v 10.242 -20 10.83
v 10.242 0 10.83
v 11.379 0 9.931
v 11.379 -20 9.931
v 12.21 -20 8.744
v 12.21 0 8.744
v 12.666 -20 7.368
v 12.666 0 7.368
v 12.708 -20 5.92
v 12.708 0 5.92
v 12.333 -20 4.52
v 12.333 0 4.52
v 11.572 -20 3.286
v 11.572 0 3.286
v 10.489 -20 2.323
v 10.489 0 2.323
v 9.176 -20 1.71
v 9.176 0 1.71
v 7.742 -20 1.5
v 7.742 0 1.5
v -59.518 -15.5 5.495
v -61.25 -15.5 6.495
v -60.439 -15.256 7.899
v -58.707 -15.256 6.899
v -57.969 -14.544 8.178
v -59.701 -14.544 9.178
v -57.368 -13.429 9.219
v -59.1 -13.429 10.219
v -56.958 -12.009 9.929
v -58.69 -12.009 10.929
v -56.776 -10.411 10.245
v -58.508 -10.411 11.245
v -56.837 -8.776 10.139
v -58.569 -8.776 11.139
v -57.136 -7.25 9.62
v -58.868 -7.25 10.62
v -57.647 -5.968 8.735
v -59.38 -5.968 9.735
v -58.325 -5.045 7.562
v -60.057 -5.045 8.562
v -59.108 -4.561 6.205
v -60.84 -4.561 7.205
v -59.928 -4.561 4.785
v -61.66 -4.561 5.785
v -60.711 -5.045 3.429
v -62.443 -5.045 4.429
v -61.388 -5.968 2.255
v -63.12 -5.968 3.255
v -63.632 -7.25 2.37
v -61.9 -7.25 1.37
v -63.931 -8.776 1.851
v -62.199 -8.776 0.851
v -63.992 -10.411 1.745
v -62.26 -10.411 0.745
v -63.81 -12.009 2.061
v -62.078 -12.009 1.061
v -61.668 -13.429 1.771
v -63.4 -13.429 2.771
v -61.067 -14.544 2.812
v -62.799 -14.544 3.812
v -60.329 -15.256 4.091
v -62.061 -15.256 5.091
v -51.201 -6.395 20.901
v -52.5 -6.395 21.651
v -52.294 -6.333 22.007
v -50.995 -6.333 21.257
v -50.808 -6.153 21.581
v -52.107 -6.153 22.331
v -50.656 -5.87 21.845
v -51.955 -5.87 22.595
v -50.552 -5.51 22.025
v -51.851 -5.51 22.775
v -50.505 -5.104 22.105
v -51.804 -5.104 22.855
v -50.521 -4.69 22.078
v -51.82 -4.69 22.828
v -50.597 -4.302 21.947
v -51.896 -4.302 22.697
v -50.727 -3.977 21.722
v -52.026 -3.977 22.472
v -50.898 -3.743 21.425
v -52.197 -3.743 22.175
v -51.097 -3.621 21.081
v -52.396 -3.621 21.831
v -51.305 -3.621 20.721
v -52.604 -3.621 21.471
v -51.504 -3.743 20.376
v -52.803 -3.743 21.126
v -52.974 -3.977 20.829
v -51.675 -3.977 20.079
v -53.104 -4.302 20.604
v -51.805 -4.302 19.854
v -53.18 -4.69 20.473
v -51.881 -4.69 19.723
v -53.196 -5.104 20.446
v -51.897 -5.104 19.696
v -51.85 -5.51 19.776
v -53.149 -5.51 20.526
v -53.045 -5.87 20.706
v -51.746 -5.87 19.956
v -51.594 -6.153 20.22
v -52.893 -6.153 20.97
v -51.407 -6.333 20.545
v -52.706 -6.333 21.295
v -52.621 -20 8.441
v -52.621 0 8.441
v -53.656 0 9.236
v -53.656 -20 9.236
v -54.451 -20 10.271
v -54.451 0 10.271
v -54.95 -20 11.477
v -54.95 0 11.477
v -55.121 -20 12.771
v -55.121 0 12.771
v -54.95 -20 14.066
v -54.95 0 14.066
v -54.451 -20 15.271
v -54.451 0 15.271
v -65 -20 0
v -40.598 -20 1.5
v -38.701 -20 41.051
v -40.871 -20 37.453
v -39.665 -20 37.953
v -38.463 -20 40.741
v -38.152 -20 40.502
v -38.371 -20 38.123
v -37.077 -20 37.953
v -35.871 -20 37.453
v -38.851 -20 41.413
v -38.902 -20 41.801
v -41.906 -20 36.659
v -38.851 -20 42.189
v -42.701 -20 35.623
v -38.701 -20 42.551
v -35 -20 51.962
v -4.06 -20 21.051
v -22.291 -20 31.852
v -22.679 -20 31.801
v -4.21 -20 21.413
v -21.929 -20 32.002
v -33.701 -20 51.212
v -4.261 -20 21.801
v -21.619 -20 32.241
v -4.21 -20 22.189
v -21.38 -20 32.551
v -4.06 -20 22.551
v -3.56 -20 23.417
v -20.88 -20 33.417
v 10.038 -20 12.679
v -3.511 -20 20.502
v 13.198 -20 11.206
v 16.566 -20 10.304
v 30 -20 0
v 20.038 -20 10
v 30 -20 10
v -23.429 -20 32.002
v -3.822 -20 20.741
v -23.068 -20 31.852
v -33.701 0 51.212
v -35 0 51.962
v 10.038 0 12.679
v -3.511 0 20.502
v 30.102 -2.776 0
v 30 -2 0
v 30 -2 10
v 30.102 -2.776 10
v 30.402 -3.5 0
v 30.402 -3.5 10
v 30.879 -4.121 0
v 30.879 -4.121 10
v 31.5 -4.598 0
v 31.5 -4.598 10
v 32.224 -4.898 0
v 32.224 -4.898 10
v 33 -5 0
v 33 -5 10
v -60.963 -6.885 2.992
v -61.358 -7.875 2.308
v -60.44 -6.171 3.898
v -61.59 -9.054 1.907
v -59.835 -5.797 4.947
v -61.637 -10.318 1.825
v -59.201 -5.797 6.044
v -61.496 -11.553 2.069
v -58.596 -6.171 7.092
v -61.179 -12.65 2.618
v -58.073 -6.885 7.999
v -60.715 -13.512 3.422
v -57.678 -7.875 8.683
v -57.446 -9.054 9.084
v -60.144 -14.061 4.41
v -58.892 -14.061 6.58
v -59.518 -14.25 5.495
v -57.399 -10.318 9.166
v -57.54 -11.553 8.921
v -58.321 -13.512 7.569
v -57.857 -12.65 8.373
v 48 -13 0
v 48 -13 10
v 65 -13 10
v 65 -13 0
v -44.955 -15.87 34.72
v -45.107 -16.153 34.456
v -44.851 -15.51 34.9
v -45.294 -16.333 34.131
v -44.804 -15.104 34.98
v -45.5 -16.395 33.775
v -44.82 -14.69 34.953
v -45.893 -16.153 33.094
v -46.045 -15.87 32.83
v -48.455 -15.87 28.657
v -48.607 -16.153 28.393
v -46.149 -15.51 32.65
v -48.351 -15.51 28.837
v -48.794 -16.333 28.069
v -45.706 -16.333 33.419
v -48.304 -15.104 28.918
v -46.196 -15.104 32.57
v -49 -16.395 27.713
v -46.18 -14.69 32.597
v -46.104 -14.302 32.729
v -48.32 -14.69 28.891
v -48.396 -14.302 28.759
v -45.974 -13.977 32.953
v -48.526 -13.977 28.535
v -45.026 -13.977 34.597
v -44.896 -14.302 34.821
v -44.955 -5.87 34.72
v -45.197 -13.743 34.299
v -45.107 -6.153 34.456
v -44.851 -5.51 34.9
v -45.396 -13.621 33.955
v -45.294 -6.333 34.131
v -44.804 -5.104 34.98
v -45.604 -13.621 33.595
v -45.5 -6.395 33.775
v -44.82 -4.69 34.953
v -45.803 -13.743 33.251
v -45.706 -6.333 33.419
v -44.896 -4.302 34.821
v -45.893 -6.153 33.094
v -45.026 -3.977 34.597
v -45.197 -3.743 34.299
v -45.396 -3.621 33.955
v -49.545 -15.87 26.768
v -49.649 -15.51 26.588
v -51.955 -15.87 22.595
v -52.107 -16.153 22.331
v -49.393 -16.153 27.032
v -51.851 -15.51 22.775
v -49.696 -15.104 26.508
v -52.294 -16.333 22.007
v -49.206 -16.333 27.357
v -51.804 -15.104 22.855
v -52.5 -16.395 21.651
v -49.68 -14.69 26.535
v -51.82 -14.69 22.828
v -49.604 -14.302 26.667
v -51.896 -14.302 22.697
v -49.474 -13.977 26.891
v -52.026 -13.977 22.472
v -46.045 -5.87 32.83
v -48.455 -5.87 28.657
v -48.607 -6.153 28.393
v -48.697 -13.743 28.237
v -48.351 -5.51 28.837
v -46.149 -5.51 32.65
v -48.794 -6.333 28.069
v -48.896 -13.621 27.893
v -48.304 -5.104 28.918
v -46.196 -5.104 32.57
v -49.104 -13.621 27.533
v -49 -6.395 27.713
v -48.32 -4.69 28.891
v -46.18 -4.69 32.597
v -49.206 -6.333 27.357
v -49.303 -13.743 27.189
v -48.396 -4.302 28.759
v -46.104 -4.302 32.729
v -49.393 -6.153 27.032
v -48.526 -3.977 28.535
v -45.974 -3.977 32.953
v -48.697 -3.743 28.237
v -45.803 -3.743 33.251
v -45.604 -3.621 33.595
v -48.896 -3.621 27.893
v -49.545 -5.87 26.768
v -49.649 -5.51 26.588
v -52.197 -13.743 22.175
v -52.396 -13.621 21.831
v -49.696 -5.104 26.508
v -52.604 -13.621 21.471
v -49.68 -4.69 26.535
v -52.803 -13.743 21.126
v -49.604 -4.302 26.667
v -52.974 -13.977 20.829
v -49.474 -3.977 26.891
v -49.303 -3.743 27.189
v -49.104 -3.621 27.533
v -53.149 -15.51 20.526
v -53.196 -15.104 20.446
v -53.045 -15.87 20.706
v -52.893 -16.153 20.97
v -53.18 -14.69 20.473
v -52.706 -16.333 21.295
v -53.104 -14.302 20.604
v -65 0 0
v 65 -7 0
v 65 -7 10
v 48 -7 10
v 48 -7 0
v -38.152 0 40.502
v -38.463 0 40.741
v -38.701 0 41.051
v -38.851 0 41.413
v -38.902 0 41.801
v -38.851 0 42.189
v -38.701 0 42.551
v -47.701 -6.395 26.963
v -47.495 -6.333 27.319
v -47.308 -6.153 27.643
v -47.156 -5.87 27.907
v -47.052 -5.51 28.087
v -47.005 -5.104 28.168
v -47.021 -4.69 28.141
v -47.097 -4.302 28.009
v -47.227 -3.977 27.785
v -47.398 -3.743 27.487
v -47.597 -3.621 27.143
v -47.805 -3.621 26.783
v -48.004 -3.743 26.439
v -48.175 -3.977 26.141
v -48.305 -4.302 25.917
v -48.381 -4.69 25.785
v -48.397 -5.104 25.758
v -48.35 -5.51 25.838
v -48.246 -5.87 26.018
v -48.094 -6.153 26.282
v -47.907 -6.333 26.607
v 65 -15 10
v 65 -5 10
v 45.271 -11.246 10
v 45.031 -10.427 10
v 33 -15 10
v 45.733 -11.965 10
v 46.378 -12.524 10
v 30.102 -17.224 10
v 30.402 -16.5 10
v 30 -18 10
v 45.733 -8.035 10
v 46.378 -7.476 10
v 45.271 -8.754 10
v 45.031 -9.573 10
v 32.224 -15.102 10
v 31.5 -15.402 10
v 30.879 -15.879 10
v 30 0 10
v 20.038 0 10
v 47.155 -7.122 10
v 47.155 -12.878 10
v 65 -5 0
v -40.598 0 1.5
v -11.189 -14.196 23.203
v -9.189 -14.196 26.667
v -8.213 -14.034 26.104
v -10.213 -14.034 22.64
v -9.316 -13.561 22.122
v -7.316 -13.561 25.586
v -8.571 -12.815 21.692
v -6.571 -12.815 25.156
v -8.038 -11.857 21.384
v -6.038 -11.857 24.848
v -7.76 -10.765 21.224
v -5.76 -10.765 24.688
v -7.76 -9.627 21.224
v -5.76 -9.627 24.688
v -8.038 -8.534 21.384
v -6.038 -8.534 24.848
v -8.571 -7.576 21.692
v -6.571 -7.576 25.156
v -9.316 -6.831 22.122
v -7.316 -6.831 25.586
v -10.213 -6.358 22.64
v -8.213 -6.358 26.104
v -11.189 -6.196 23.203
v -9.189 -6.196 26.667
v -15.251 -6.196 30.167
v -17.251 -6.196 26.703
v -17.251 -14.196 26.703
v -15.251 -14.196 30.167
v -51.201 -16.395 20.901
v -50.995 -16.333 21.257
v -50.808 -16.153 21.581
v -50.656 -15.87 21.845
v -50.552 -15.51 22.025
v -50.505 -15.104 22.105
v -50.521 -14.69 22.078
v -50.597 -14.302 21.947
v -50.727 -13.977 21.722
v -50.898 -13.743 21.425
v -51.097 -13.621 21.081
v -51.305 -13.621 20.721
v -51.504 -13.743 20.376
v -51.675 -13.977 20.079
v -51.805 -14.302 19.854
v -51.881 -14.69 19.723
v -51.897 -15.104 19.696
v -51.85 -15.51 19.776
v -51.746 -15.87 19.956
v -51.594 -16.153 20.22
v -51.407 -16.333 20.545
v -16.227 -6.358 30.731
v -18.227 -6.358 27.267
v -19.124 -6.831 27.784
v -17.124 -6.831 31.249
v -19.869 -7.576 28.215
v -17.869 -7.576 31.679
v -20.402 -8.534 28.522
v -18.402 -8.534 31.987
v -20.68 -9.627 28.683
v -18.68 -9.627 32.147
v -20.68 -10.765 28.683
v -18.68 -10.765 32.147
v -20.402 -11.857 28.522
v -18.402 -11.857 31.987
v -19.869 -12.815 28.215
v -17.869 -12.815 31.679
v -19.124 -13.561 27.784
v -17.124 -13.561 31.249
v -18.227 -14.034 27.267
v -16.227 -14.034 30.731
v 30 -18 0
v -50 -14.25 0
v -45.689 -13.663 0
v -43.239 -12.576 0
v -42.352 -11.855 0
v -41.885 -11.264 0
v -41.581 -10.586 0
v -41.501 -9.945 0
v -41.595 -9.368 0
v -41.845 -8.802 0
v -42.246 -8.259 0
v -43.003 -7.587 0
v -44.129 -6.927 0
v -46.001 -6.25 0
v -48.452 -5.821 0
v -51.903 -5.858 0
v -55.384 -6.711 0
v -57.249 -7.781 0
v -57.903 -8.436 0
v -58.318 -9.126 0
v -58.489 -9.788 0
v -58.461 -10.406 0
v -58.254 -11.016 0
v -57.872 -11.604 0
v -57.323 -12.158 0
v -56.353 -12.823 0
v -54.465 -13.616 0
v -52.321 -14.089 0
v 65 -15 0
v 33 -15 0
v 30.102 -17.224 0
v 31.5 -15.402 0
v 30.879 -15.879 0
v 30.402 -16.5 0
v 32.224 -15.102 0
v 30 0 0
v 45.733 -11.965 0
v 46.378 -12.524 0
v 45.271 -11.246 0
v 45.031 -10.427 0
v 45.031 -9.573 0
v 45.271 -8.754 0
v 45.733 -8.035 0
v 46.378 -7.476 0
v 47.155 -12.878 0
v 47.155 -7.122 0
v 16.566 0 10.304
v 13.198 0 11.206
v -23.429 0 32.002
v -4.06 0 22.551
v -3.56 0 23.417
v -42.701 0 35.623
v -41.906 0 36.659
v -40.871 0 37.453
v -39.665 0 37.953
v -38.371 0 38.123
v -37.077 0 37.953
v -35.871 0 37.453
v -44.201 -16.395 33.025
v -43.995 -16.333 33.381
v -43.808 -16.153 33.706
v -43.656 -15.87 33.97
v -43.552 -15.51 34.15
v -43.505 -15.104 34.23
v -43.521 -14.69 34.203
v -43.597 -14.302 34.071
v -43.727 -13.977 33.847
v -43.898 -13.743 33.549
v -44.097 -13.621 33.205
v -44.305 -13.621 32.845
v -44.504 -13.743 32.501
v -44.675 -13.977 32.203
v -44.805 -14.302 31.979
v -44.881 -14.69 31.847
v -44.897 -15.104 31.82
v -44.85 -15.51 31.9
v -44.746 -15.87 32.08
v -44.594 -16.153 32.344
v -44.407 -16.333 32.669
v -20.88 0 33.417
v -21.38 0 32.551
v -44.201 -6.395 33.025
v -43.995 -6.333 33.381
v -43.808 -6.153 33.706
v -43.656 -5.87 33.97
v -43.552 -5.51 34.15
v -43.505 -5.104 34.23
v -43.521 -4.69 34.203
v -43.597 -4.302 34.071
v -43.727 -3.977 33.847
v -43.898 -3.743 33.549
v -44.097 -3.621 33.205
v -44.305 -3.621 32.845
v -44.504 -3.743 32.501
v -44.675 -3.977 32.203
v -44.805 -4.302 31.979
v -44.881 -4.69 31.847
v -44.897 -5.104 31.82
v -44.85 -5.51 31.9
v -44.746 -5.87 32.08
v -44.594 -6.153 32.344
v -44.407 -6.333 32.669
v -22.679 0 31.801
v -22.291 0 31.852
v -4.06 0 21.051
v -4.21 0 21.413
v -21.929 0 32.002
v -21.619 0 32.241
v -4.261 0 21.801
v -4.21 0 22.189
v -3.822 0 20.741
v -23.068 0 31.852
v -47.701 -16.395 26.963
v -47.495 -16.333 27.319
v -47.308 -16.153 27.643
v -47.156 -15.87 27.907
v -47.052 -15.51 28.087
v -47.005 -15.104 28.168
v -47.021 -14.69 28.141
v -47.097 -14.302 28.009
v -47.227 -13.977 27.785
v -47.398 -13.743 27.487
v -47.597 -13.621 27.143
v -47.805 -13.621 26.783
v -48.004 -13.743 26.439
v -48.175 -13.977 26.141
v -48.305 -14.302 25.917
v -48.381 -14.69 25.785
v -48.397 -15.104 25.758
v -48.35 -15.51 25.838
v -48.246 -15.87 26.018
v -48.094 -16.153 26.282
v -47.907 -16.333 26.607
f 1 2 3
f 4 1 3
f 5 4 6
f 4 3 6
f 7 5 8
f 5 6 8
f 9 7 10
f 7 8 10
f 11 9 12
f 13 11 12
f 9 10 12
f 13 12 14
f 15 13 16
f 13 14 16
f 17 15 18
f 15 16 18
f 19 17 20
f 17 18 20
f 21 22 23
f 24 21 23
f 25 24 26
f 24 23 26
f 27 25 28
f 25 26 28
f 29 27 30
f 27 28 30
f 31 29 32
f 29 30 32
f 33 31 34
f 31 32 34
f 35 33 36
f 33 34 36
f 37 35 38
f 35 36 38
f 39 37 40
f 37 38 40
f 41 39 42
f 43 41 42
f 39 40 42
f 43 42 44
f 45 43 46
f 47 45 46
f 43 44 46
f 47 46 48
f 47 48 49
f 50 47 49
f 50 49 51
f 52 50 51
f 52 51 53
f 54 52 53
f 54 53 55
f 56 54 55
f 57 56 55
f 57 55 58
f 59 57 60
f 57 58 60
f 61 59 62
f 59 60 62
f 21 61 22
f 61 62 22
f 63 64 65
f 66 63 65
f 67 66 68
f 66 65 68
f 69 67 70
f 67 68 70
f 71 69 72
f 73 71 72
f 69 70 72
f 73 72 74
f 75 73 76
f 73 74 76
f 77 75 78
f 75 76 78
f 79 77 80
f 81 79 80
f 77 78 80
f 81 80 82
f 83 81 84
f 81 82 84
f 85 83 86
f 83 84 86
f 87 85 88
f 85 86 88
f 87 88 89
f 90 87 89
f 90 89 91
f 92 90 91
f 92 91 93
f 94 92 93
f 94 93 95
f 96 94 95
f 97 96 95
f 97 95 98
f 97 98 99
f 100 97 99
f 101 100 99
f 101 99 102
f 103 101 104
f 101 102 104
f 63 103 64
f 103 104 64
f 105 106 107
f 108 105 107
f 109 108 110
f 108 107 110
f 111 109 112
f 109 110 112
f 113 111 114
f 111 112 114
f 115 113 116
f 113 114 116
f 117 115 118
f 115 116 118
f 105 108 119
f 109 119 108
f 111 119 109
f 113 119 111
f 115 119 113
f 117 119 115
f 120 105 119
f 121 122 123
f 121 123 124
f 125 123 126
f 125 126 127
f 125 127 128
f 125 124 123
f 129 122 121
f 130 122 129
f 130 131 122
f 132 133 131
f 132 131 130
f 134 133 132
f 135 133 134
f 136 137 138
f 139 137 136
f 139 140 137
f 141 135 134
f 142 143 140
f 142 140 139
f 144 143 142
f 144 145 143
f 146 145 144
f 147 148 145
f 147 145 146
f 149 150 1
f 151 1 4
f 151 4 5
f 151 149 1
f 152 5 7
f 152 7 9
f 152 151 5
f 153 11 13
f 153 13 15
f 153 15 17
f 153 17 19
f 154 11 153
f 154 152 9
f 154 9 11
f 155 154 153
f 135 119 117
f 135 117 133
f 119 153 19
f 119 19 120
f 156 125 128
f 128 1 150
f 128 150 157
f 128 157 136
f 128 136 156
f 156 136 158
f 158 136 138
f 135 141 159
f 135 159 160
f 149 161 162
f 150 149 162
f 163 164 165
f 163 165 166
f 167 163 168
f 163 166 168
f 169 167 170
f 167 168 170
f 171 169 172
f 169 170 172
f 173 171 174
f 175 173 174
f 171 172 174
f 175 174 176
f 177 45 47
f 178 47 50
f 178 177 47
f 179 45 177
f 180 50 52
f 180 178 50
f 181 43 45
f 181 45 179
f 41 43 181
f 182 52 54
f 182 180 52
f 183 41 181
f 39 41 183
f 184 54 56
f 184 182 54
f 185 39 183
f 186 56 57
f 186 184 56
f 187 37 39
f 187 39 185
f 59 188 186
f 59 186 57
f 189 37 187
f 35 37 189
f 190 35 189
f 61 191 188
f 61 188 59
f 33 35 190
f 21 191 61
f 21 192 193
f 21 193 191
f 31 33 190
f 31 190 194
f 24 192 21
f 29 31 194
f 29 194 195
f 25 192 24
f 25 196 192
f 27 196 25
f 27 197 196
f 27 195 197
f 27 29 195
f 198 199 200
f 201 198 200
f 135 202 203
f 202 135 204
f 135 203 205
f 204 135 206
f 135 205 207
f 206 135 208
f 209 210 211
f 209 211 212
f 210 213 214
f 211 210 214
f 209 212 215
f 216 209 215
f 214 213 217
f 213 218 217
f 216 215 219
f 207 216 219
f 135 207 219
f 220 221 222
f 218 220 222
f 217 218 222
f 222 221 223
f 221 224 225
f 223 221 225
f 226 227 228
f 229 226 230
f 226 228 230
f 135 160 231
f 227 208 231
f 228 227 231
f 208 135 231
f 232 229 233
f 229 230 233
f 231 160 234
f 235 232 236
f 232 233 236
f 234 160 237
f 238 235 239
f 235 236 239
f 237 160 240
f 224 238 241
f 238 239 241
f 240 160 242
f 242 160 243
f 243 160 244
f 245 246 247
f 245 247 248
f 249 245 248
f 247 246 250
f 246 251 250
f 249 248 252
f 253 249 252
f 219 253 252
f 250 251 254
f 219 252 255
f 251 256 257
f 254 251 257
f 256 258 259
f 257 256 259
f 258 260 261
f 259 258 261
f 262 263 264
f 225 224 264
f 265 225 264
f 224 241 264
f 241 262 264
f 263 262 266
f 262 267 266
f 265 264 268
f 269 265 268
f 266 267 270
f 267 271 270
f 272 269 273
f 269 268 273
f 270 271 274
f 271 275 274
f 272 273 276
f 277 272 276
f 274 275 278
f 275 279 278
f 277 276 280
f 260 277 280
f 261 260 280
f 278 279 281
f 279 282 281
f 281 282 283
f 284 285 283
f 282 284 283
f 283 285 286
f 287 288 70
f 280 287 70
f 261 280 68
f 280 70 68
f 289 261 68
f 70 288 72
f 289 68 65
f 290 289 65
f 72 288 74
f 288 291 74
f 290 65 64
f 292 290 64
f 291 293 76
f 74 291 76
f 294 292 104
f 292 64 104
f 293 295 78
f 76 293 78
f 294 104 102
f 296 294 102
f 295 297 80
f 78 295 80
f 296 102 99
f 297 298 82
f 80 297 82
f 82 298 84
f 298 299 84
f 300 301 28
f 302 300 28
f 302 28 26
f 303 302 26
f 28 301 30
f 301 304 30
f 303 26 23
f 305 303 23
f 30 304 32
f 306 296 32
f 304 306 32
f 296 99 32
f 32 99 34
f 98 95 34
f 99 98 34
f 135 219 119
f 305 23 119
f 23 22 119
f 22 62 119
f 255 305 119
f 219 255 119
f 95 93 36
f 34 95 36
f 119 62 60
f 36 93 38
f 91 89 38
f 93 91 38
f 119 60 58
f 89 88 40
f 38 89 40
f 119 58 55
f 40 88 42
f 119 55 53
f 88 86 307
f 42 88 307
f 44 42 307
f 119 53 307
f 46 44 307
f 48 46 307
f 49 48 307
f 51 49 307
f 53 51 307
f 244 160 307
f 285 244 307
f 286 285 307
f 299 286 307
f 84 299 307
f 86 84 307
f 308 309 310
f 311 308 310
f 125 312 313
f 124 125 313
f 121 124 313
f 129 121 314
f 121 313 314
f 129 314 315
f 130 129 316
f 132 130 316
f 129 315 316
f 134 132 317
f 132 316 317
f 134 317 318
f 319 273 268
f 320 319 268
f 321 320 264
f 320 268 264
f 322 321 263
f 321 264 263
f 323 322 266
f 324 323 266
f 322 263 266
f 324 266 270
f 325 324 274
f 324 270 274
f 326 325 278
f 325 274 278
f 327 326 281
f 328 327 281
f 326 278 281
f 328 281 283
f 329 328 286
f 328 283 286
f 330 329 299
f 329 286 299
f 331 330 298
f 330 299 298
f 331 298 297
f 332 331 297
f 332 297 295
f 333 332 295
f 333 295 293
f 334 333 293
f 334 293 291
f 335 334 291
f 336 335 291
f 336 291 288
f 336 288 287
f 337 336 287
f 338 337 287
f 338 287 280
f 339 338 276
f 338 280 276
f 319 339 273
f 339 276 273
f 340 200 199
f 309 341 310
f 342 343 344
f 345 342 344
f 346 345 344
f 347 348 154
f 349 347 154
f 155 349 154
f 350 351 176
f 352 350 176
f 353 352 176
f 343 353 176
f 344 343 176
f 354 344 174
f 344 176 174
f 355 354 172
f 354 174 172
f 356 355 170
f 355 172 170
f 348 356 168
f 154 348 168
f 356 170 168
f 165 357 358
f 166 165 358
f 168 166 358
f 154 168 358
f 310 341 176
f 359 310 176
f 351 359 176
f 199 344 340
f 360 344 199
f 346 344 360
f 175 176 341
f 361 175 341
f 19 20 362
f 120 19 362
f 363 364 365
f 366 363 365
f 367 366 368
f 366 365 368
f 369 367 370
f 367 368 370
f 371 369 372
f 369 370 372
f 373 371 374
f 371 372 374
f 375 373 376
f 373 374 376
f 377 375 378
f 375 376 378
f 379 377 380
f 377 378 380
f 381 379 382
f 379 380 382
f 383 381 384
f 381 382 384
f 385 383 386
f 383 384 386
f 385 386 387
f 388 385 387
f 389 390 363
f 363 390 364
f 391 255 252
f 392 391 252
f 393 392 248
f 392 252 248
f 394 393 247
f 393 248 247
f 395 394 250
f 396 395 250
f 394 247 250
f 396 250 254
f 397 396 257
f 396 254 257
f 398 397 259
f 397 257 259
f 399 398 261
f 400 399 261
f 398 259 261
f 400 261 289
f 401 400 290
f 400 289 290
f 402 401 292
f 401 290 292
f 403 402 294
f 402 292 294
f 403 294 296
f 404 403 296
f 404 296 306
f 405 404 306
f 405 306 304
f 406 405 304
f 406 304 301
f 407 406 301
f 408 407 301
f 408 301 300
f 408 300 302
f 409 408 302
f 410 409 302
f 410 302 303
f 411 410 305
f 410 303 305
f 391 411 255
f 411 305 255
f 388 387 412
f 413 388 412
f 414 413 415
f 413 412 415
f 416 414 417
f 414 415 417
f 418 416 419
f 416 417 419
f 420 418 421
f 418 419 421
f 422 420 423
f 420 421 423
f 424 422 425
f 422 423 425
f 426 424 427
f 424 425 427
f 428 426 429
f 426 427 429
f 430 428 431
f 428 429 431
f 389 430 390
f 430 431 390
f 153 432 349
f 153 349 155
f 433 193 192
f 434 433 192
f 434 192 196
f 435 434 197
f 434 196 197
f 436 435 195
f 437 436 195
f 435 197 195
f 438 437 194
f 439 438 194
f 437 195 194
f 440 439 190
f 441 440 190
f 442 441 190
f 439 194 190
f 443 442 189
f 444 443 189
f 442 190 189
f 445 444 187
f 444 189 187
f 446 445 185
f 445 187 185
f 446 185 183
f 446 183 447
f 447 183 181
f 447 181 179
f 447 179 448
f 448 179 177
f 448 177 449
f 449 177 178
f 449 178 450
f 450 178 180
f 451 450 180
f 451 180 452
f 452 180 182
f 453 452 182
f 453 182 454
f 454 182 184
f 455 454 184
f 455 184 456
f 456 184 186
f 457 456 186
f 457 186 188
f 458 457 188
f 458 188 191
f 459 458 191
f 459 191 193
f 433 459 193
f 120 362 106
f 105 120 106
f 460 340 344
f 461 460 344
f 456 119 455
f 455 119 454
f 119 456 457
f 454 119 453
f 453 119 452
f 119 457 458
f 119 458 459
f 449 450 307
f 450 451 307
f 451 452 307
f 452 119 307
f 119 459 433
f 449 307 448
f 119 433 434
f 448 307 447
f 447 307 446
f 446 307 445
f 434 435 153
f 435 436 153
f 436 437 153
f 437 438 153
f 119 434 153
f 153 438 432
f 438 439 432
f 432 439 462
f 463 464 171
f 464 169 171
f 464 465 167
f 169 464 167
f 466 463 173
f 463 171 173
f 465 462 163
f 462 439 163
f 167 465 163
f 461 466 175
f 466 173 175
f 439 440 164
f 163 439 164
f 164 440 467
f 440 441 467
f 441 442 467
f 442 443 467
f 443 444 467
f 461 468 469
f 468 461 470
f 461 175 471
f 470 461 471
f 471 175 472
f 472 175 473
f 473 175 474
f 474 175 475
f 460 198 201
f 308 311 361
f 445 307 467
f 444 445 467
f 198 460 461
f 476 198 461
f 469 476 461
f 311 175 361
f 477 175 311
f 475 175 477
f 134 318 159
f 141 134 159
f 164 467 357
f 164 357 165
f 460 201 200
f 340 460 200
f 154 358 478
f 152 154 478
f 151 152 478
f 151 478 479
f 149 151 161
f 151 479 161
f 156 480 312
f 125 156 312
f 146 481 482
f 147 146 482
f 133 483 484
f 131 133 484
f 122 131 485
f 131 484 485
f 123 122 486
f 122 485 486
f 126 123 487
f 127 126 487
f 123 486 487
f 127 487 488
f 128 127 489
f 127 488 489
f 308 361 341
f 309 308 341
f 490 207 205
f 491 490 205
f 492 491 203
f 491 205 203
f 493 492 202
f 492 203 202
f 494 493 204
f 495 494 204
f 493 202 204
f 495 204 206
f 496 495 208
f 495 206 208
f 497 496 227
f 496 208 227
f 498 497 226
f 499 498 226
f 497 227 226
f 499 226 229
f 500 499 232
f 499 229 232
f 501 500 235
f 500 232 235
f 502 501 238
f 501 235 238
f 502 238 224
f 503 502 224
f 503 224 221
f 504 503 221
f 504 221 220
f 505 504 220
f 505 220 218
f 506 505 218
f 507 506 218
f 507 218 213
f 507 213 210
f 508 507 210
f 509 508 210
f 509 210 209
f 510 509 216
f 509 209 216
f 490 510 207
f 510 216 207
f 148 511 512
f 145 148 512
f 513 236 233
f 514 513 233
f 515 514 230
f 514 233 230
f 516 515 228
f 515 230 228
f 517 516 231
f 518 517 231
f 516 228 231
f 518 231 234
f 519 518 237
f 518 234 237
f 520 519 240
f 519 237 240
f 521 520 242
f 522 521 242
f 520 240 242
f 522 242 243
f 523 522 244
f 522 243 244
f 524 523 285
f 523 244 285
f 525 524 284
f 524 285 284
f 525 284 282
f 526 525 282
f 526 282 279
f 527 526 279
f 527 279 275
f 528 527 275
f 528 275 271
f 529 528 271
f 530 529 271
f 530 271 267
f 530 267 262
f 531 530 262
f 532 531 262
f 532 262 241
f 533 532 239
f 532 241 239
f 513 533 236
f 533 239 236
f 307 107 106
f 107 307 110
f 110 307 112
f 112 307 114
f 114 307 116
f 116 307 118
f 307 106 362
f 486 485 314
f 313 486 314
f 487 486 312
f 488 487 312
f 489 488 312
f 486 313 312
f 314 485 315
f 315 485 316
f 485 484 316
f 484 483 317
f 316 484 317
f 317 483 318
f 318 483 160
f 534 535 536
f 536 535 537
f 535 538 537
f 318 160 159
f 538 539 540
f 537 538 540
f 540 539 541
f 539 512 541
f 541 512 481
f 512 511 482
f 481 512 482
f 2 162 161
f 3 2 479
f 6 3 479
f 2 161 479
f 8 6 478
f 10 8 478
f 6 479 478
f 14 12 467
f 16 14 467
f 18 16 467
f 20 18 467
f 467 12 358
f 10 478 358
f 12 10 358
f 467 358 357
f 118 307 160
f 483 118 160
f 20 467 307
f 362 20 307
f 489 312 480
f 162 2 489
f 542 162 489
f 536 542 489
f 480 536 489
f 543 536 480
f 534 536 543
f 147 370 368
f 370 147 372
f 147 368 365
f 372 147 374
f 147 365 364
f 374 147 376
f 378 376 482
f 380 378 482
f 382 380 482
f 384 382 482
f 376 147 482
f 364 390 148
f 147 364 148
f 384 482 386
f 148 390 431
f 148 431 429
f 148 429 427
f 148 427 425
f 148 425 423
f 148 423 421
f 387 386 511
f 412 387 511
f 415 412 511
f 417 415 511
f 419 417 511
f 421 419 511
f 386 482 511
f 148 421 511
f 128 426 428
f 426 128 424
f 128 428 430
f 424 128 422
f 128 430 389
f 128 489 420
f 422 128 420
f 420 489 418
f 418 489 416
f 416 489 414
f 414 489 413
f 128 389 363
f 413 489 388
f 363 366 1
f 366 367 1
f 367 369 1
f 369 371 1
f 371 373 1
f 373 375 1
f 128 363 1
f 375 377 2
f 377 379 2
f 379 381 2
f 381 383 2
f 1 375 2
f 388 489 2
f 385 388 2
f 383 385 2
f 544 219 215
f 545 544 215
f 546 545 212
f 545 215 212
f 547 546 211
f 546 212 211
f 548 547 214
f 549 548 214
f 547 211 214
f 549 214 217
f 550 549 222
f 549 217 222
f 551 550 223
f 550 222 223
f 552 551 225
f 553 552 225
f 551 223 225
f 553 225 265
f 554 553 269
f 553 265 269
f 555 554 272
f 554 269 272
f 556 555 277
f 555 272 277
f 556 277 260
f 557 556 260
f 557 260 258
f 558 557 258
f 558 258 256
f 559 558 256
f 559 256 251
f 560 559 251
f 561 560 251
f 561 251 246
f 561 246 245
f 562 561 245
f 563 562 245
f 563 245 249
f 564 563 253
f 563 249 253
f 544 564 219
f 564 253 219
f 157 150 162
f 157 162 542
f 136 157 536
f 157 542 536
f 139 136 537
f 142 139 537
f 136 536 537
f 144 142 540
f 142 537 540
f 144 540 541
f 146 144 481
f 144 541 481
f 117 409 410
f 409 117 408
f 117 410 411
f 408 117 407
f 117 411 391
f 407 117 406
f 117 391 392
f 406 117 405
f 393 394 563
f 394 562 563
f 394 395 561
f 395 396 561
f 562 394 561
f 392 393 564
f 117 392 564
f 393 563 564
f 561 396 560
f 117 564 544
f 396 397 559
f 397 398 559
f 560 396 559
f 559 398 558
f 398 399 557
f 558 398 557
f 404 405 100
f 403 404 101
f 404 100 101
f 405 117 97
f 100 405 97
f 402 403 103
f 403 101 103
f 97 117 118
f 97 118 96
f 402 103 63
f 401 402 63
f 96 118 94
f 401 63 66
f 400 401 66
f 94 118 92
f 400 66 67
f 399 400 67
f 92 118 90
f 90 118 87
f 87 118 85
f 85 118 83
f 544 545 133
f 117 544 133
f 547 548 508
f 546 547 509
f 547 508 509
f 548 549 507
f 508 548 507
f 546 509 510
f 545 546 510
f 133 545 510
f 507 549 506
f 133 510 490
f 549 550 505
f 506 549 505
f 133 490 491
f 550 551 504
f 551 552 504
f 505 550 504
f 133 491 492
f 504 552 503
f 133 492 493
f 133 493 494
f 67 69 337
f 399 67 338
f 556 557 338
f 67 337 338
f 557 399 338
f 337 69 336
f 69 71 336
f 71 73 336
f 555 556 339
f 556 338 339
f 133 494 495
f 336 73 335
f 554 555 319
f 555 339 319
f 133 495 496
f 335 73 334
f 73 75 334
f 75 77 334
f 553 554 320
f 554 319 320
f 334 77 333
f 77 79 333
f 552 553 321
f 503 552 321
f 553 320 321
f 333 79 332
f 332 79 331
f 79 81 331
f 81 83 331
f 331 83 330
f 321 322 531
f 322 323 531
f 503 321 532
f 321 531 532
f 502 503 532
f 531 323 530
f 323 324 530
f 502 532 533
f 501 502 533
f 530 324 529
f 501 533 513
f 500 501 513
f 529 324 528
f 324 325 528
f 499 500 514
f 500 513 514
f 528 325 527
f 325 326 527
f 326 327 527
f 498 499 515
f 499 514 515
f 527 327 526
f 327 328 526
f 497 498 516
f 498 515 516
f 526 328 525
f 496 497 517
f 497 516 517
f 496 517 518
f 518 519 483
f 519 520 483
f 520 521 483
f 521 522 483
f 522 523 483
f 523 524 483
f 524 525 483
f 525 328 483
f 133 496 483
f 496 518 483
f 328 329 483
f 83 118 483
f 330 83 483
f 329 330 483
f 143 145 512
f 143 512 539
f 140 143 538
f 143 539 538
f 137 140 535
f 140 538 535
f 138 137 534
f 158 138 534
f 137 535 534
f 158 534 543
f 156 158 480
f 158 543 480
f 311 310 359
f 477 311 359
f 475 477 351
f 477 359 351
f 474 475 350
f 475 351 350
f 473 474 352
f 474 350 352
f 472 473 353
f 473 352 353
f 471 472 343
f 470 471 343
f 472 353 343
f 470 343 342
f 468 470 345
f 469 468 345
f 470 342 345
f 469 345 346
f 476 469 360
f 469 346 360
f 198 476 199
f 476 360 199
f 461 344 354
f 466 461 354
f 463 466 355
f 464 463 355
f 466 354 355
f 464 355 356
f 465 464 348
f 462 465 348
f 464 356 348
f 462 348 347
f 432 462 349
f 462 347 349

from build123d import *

# Parameters (mm, degrees)
F1_DEPTH  = 20
F3_DEPTH  = 25
F6_DEPTH  = 4
F8_R      = 1.395
F9_DEPTH  = 1.5
F8_R_2    = 4.25
F10_DEPTH = 112.584302492
F8_R_3    = 5.5
F11_DEPTH = 2


with BuildPart() as f1:
    # F0 (on Front) → F1 (new body)
    with BuildSketch(Plane.XZ):
        with BuildLine():
            Line((-35, 51.9615242271), (-65, 0))
            Line((-65, 0), (65, 0))
            Line((65, 0), (65, 10))
            Line((65, 10), (20.0384757729, 10))
            ThreePointArc((20.0384757729, 10), (14.8620948709, 10.6814834742), (10.0384757729, 12.6794919243))
            Line((10.0384757729, 12.6794919243), (-3.5109076373, 20.5022320835))
            ThreePointArc((-3.5109076373, 20.5022320835), (-4.2097963767, 21.4130416216), (-4.0599457429, 22.5512701892))
            Line((-4.0599457429, 22.5512701892), (-3.5599457429, 23.417295593))
            Line((-3.5599457429, 23.417295593), (-20.8804538186, 33.417295593))
            Line((-20.8804538186, 33.417295593), (-21.3804538186, 32.5512701892))
            ThreePointArc((-21.3804538186, 32.5512701892), (-22.2912633567, 31.8523814498), (-23.4294919243, 32.0022320835))
            Line((-23.4294919243, 32.0022320835), (-38.1519237886, 40.5022320835))
            ThreePointArc((-38.1519237886, 40.5022320835), (-38.8508125281, 41.4130416216), (-38.7009618943, 42.5512701892))
            Line((-38.7009618943, 42.5512701892), (-33.7009618943, 51.2115242271))
            Line((-33.7009618943, 51.2115242271), (-35, 51.9615242271))
        make_face()
        with BuildLine():
            ThreePointArc((-52.6208348754, 8.4413429511), (-54.9504640068, 11.4773747445), (-54.4509618943, 15.27146997))
            Line((-54.4509618943, 15.27146997), (-42.7009618943, 35.6230669589))
            ThreePointArc((-42.7009618943, 35.6230669589), (-39.6649301009, 37.9526960904), (-35.8708348754, 37.4531939779))
            Line((-35.8708348754, 37.4531939779), (10.2416697508, 10.8301270189))
            ThreePointArc((10.2416697508, 10.8301270189), (12.5712988822, 5.2059047745), (7.7416697508, 1.5))
            Line((7.7416697508, 1.5), (-40.5980762114, 1.5))
            Line((-40.5980762114, 1.5), (-52.6208348754, 8.4413429511))
        make_face(mode=Mode.SUBTRACT)
    extrude(amount=F1_DEPTH)

    # F2 (on face) → F3 (cut)
    with BuildSketch(Plane.XY.offset(10)):
        with BuildLine():
            Line((65, -17.963156903), (65, -15))
            Line((65, -15), (33, -15))
            ThreePointArc((33, -15), (30.8786796564, -15.8786796564), (30, -18))
            Line((30, -18), (30, -20))
            Line((30, -20), (65, -20))
            Line((65, -20), (65, -17.963156903))
        make_face()
        with BuildLine():
            Line((65, -7), (48, -7))
            ThreePointArc((48, -7), (45, -10), (48, -13))
            Line((48, -13), (65, -13))
            Line((65, -13), (65, -7))
        make_face()
        with BuildLine():
            Line((33, -5), (65, -5))
            Line((65, -5), (65, -2.036843097))
            Line((65, -2.036843097), (65, 0))
            Line((65, 0), (30, 0))
            Line((30, 0), (30, -2))
            ThreePointArc((30, -2), (30.8786796564, -4.1213203436), (33, -5))
        make_face()
    extrude(amount=-F3_DEPTH, mode=Mode.SUBTRACT)

    # F5 (on offset) → F6 (cut, through all)
    with BuildSketch(Plane(origin=(9.25, 0, 16.02146997), x_dir=(0.8660254038, 0, -0.5), z_dir=(0.5, 0, 0.8660254038))):
        with BuildLine():
            Line((-21.291651246, -6.195820753), (-28.291651246, -6.195820753))
            ThreePointArc((-28.291651246, -6.195820753), (-32.291651246, -10.195820753), (-28.291651246, -14.195820753))
            Line((-28.291651246, -14.195820753), (-21.291651246, -14.195820753))
            ThreePointArc((-21.291651246, -14.195820753), (-17.291651246, -10.195820753), (-21.291651246, -6.195820753))
        make_face()
    extrude(amount=-F6_DEPTH, mode=Mode.SUBTRACT)

    # F8 (on offset) → F9 (cut, through all)
    with BuildSketch(Plane(origin=(-48.75, 0, 28.145825623), x_dir=(0, -1, 0), z_dir=(-0.8660254038, 0, 0.5))):
        with Locations((5, -7.5)):
            Circle(F8_R)
        with Locations((5, -0.5)):
            Circle(F8_R)
        with Locations((5, 6.5)):
            Circle(F8_R)
        with Locations((15, -7.5)):
            Circle(F8_R)
        with Locations((15, -0.5)):
            Circle(F8_R)
        with Locations((15, 6.5)):
            Circle(F8_R)
    extrude(amount=-F9_DEPTH, mode=Mode.SUBTRACT)

    # F8 (on offset) → F10 (cut, through all)
    with BuildSketch(Plane(origin=(-48.75, 0, 28.145825623), x_dir=(0, -1, 0), z_dir=(-0.8660254038, 0, 0.5))):
        with Locations((10, -25)):
            Circle(F8_R_2)
    extrude(amount=-F10_DEPTH, mode=Mode.SUBTRACT)

    # F8 (on offset) → F11 (cut)
    with BuildSketch(Plane(origin=(-48.75, 0, 28.145825623), x_dir=(0, -1, 0), z_dir=(-0.8660254038, 0, 0.5))):
        with Locations((10, -25)):
            Circle(F8_R_3)
        with Locations((10, -25)):
            Circle(F8_R_2, mode=Mode.SUBTRACT)
    extrude(amount=-F11_DEPTH, mode=Mode.SUBTRACT)


solid = f1.part
